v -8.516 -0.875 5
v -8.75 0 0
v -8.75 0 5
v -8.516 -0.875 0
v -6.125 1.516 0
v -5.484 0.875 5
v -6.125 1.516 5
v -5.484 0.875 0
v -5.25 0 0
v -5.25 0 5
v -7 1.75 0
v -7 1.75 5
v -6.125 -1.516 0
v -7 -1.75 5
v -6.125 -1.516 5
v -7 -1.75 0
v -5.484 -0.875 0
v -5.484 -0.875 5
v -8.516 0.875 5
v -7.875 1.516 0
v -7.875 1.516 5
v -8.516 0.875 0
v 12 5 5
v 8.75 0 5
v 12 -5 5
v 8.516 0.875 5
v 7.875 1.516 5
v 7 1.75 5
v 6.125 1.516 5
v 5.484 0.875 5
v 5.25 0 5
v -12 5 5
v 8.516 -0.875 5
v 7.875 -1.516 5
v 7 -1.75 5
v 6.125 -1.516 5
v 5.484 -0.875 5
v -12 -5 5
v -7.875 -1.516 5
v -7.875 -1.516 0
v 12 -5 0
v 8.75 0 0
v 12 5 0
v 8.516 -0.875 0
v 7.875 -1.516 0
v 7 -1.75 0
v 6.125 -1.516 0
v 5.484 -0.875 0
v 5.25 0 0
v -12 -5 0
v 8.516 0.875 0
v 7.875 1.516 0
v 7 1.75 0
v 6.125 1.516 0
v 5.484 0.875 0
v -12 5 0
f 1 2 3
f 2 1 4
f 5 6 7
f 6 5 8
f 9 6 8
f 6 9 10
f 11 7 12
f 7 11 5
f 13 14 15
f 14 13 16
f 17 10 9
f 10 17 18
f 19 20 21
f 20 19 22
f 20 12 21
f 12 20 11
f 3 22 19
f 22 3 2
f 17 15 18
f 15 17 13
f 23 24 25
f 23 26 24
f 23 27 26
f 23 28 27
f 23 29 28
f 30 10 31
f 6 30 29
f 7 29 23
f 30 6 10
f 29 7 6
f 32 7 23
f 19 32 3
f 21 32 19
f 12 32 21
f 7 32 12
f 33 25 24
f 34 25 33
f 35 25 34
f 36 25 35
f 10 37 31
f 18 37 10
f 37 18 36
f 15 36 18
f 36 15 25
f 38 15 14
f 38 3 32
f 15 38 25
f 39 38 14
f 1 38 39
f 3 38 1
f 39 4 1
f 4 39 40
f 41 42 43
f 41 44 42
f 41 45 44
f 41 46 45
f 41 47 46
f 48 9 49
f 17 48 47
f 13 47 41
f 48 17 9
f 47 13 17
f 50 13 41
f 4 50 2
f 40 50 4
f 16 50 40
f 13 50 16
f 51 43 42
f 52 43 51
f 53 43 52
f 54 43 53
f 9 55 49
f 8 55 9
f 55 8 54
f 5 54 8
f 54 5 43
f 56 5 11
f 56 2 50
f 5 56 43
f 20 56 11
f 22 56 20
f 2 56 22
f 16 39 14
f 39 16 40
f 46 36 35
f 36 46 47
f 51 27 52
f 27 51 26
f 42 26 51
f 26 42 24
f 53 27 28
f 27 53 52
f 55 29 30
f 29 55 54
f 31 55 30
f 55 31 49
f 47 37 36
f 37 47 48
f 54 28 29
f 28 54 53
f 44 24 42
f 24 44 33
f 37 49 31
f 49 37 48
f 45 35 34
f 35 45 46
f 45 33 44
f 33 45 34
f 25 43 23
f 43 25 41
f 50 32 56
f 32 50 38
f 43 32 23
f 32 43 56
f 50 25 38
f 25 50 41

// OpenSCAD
difference()
{
    union()
    {
        translate([-(14+10)/2,-10/2,0])
            cube([14+10,10,5]);
        
    }
    union()
    {
        translate([-7,0,0])
            cylinder(d=3.5,h=5,$fn=12);
        translate([7,0,0])
            cylinder(d=3.5,h=5,$fn=12);
    }
}
